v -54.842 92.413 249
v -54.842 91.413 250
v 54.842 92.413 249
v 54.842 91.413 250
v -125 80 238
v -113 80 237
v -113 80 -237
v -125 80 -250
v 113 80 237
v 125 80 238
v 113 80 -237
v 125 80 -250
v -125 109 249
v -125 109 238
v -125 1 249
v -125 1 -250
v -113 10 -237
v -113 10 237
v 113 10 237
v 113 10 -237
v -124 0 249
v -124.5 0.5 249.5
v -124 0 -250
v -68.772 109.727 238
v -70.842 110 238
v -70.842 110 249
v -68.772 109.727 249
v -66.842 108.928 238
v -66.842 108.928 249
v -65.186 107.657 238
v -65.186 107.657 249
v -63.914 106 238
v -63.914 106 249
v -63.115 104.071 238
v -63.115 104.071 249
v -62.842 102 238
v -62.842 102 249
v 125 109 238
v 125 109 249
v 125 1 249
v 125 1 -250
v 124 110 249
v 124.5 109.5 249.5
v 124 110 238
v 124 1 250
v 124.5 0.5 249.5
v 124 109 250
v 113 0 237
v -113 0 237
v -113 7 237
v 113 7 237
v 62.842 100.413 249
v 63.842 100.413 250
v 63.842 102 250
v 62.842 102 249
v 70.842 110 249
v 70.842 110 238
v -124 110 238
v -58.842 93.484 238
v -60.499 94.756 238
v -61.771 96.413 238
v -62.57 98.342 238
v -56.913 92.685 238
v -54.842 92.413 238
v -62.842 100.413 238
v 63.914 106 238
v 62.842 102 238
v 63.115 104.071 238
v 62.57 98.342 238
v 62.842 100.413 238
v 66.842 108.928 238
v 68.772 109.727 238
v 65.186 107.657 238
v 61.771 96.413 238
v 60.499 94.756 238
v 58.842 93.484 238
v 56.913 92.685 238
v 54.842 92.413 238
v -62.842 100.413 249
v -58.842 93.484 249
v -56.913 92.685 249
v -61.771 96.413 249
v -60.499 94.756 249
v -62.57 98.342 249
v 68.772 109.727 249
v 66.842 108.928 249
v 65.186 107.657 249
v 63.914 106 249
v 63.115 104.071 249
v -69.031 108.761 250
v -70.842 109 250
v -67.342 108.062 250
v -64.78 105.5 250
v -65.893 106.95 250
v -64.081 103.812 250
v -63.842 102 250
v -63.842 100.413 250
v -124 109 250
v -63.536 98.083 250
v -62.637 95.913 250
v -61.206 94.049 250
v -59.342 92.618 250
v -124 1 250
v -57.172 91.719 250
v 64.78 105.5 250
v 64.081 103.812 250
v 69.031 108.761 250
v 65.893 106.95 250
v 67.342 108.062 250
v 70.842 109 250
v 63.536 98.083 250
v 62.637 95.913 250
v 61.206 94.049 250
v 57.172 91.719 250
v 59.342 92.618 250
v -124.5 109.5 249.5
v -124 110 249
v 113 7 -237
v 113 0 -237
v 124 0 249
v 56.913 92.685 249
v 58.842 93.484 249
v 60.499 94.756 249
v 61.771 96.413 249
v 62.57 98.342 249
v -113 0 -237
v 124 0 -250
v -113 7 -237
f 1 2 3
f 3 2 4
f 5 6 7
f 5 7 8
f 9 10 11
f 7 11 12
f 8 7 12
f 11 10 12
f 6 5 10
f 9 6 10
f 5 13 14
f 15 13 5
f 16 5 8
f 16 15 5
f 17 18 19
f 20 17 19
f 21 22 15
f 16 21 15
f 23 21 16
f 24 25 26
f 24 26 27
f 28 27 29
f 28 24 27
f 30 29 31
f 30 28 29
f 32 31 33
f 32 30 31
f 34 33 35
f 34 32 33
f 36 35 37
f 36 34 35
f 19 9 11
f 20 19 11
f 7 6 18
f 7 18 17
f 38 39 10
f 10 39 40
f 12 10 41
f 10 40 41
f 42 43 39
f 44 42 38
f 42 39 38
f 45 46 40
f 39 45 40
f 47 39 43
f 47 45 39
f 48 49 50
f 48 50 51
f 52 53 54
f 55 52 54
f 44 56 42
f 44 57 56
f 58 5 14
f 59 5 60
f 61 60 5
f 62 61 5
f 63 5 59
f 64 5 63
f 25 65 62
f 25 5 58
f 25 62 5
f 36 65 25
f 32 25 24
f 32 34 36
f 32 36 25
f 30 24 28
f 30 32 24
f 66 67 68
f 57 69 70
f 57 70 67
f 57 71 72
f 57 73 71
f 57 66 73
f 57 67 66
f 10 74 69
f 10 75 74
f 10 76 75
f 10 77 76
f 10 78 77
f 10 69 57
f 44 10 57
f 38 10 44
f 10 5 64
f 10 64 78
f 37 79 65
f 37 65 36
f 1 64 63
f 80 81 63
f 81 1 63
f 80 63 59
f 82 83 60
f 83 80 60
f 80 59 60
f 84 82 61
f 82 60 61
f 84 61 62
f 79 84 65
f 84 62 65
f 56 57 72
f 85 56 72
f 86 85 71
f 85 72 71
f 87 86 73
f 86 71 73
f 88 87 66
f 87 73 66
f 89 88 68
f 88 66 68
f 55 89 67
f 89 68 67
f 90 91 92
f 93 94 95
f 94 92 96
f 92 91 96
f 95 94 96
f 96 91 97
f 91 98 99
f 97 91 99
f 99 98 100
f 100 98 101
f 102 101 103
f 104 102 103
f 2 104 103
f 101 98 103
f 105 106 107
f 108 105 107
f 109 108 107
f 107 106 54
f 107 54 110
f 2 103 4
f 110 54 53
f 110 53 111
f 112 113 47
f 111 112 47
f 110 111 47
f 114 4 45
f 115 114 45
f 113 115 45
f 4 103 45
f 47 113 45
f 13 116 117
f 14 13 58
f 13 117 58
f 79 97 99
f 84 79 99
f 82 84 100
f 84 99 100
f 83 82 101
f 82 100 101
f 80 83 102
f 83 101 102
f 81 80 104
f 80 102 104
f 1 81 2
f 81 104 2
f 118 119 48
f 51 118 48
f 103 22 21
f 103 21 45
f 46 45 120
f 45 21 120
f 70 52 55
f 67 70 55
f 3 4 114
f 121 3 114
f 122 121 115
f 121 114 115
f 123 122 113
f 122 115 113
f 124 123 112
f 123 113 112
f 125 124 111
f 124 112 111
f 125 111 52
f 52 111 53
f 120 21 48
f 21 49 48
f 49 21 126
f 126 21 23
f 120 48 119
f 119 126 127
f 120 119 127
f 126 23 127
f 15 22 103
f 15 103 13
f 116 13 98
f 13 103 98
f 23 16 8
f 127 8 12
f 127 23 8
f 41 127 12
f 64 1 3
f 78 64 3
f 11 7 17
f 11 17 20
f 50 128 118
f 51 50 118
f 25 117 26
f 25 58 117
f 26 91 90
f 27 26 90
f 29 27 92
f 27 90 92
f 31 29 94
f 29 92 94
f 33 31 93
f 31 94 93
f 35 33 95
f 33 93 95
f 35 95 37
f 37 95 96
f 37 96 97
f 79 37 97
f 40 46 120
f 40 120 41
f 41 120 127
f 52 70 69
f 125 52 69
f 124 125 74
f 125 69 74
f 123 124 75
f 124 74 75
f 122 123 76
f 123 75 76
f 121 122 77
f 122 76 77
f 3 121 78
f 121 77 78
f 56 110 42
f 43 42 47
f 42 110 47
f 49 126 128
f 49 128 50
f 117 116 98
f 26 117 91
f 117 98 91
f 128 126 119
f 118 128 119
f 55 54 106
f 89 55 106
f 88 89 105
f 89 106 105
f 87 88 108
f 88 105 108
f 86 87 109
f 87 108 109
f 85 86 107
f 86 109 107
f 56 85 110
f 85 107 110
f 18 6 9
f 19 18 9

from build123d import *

# Parameters (mm, degrees)
SKETCH1_W           = 250
SKETCH1_H           = 500
BOSS_EXTRUDE1_DEPTH = 110
SKETCH2_W           = 226
SKETCH2_H           = 474
CUT_EXTRUDE1_DEPTH  = 100
SKETCH3_W           = 226
SKETCH3_H           = 474
CUT_EXTRUDE2_DEPTH  = 7
SKETCH4_W           = 531.711239379
SKETCH4_H           = 96.104903681
CUT_EXTRUDE3_DEPTH  = 251
SKETCH5_W           = 125.68494841
SKETCH5_H           = 51.126080709
CUT_EXTRUDE4_DEPTH  = 15
FILLET1_R           = 8
CHAMFER1_SIZE       = 1
CHAMFER2_SIZE       = 1


with BuildPart() as part:
    # Sketch1 → Boss-Extrude1 (new body)
    with BuildSketch(Plane(origin=(0, 0, 0), x_dir=(1, 0, 0), z_dir=(0, 1, 0))):
        Rectangle(SKETCH1_W, SKETCH1_H)
    extrude(amount=BOSS_EXTRUDE1_DEPTH)

    # Sketch2 → Cut-Extrude1 (cut)
    with BuildSketch(Plane(origin=(0, 110, 0), x_dir=(1, 0, 0), z_dir=(0, 1, 0))):
        Rectangle(SKETCH2_W, SKETCH2_H)
    extrude(amount=-CUT_EXTRUDE1_DEPTH, mode=Mode.SUBTRACT)

    # Sketch3 → Cut-Extrude2 (cut)
    with BuildSketch(Plane.XZ):
        Rectangle(SKETCH3_W, SKETCH3_H)
    extrude(amount=-CUT_EXTRUDE2_DEPTH, mode=Mode.SUBTRACT)

    # Sketch4 → Cut-Extrude3 (cut, through all)
    with BuildSketch(Plane(origin=(125, 0, 0), x_dir=(0, 0, -1), z_dir=(1, 0, 0))):
        with Locations((27.855619689, 128.05245184)):
            Rectangle(SKETCH4_W, SKETCH4_H)
    extrude(amount=-CUT_EXTRUDE3_DEPTH, mode=Mode.SUBTRACT)

    # Sketch5 → Cut-Extrude4 (cut)
    with BuildSketch(Plane.XY.offset(250)):
        with Locations((0, 117.975615041)):
            Rectangle(SKETCH5_W, SKETCH5_H)
    extrude(amount=-CUT_EXTRUDE4_DEPTH, mode=Mode.SUBTRACT)

    # Fillet1
    fillet1_edges = [part.edges().sort_by_distance(p)[0] for p in [
        (62.842474205, 110, 244),
        (62.842474205, 92.412574686, 244),
        (-62.842474205, 110, 244),
        (-62.842474205, 92.412574686, 244),
    ]]
    fillet(fillet1_edges, radius=FILLET1_R)

    # Chamfer1
    chamfer1_edges = [part.edges().sort_by_distance(p)[0] for p in [
        (-97.921237103, 110, 250),
        (0, 0, 250),
        (125, 55, 250),
        (-125, 55, 250),
        (62.842474205, 101.206287343, 250),
        (0, 92.412574686, 250),
        (97.921237103, 110, 250),
        (-62.842474205, 101.206287343, 250),
        (-65.185619956, 107.656854249, 250),
        (65.185619956, 107.656854249, 250),
        (60.499328455, 94.755720436, 250),
        (-60.499328455, 94.755720436, 250),
    ]]
    chamfer(chamfer1_edges, length=CHAMFER1_SIZE)

    # Chamfer2
    chamfer2_edges = [part.edges().sort_by_distance(p)[0] for p in [
        (125, 110, 243.5),
        (125, 0, -0.5),
        (-125, 110, 243.5),
        (-125, 0, -0.5),
    ]]
    chamfer(chamfer2_edges, length=CHAMFER2_SIZE)


solid = part.part
